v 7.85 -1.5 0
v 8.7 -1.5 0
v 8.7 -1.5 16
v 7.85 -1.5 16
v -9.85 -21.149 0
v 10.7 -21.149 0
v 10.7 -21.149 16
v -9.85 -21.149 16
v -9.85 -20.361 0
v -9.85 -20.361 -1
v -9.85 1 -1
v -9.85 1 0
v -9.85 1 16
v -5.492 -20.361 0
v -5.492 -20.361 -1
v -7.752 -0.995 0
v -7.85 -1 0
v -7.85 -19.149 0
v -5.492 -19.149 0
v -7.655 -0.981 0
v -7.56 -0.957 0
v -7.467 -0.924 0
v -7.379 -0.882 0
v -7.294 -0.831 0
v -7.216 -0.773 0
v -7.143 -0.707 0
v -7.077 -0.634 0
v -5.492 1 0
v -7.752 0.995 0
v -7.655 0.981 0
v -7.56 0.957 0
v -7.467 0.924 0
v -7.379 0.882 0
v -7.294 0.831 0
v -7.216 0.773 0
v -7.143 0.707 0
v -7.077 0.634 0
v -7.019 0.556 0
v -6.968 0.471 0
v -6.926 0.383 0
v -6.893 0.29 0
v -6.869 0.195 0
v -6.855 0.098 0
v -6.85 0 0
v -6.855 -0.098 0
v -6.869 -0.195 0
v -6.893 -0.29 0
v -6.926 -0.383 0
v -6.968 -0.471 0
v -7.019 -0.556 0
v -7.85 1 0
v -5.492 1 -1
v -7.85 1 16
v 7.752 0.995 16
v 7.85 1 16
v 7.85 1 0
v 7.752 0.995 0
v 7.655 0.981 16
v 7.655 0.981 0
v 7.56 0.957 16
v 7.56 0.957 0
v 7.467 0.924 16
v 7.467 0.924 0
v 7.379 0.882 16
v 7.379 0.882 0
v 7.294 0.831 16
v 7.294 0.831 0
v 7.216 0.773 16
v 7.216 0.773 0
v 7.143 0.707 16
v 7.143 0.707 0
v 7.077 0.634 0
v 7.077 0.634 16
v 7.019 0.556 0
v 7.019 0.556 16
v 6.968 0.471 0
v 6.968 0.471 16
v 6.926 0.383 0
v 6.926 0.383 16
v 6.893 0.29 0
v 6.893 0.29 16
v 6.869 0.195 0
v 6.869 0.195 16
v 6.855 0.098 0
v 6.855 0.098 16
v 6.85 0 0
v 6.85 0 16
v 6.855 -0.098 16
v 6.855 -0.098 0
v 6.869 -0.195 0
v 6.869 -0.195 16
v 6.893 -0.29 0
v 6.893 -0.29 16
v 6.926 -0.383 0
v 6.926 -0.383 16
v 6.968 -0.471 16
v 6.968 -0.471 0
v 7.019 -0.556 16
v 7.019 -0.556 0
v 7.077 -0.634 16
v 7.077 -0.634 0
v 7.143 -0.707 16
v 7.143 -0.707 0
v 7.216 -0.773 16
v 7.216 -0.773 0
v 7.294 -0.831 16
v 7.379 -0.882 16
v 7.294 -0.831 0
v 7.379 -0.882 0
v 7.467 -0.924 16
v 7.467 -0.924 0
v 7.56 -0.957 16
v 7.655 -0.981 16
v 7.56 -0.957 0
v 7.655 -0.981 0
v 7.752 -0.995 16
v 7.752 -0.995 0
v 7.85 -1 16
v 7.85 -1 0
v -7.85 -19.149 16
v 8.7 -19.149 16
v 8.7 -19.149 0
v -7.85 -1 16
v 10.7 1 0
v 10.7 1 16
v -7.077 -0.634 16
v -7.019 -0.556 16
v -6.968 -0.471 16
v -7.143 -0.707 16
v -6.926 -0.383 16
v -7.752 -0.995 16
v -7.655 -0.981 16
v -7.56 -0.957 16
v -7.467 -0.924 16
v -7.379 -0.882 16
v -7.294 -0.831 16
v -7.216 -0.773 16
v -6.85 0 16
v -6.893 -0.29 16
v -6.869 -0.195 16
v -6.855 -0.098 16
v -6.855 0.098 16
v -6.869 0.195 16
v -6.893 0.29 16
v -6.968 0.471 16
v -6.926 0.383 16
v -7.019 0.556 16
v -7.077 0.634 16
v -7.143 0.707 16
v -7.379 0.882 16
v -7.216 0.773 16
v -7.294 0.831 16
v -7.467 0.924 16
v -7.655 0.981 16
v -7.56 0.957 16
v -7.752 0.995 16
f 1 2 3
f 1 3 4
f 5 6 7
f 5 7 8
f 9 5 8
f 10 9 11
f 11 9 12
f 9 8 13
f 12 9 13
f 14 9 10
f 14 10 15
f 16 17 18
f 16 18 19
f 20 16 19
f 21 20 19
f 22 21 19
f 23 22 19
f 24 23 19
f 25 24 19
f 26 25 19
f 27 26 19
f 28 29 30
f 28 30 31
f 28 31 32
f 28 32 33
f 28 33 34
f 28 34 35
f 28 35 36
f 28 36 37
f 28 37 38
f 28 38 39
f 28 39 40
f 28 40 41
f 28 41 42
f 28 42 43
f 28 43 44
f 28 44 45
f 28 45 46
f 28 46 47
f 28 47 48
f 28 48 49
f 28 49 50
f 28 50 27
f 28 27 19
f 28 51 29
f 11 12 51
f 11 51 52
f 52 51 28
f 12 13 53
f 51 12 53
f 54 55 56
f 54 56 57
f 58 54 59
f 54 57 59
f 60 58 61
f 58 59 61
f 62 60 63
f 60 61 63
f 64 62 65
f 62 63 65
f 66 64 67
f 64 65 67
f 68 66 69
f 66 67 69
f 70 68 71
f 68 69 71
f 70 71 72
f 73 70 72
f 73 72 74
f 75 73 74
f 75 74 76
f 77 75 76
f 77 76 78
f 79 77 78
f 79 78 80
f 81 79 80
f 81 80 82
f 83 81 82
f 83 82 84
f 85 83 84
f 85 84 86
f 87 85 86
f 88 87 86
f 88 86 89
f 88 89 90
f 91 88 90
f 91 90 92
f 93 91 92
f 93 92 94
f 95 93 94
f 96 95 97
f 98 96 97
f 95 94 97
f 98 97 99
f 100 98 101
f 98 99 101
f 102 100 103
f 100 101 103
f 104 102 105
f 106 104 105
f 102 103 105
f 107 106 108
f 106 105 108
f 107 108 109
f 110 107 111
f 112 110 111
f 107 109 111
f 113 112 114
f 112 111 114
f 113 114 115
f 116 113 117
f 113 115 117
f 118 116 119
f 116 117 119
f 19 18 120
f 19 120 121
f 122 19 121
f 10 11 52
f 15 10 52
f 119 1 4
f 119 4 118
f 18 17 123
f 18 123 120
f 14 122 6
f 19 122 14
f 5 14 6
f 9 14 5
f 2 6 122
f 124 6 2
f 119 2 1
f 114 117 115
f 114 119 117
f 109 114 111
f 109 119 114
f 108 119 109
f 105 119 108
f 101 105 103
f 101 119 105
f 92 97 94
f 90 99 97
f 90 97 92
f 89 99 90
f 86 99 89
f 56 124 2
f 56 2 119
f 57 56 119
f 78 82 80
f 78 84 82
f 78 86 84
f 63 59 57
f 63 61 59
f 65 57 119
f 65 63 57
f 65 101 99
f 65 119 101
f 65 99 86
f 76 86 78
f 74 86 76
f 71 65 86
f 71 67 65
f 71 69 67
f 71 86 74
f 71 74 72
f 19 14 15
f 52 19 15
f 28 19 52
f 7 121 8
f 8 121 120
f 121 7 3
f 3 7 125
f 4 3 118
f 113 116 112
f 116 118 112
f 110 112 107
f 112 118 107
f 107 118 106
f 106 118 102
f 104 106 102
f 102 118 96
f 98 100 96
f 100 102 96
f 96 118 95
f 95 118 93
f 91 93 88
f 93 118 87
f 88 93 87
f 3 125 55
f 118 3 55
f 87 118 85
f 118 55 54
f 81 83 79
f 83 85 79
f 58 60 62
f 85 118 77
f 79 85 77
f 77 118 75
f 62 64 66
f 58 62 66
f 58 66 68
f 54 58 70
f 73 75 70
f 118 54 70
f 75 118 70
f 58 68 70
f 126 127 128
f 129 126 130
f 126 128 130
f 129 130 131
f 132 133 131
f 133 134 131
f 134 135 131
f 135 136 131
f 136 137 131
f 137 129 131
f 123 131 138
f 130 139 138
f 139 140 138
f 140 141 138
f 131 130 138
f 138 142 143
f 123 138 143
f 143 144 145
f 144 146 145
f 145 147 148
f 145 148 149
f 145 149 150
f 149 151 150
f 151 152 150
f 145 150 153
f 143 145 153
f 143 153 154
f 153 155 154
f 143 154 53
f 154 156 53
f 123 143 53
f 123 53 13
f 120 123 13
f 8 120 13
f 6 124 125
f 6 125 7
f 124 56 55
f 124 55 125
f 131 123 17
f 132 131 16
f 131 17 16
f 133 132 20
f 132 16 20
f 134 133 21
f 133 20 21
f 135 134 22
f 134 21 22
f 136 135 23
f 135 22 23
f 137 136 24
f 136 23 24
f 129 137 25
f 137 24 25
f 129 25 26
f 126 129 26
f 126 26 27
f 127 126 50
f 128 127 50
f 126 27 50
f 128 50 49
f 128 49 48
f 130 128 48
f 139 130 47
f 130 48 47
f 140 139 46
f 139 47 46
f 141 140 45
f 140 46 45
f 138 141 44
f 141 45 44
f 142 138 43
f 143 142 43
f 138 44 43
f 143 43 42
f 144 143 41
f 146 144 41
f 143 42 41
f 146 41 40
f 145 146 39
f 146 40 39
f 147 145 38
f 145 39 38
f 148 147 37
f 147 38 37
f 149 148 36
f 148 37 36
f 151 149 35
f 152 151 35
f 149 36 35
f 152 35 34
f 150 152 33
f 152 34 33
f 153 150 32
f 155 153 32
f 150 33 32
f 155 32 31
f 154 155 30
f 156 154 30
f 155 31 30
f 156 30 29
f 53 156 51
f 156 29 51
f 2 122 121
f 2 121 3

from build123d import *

# Parameters (mm, degrees)
SKETCH1_R             = 1
BOSS_EXTRUDE1_DEPTH   = 16
BOSS_EXTRUDE1_2_DEPTH = 16
BOSS_EXTRUDE2_DEPTH   = 16
SKETCH3_W             = 4.358106799
SKETCH3_H             = 21.361113411
BOSS_EXTRUDE4_DEPTH   = 1


with BuildPart() as part:
    # Sketch1 → Boss-Extrude1 (new body)
    with BuildSketch(Plane.XY):
        with Locations((-7.85, 0)):
            Circle(SKETCH1_R)
    extrude(amount=BOSS_EXTRUDE1_DEPTH)



with BuildPart() as body_2:
    # Sketch1 → Boss-Extrude1 2 (new body)
    with BuildSketch(Plane.XY):
        with Locations((7.85, 0)):
            Circle(SKETCH1_R)
    extrude(amount=BOSS_EXTRUDE1_2_DEPTH)


with BuildPart() as part_1:
    add(part.part)

    add(body_2.part)  # Boss-Extrude2 merges body 2
    # Sketch2 → Boss-Extrude2 (add, through all)
    with BuildSketch(Plane.XY):
        Polygon((7.85, 1), (10.7, 1), (10.7, -21.148770038), (-9.85, -21.148770038), (-9.85, 1), (-7.85, 1), (-7.85, -19.148770038), (8.7, -19.148770038), (8.7, -1.5), (7.85, -1.5), align=None)
    extrude(amount=BOSS_EXTRUDE2_DEPTH)

    # Sketch3 → Boss-Extrude4 (add)
    with BuildSketch(Plane.XY):
        with Locations((-7.670946601, -9.680556706)):
            Rectangle(SKETCH3_W, SKETCH3_H)
    extrude(amount=-BOSS_EXTRUDE4_DEPTH)


solid = part_1.part
